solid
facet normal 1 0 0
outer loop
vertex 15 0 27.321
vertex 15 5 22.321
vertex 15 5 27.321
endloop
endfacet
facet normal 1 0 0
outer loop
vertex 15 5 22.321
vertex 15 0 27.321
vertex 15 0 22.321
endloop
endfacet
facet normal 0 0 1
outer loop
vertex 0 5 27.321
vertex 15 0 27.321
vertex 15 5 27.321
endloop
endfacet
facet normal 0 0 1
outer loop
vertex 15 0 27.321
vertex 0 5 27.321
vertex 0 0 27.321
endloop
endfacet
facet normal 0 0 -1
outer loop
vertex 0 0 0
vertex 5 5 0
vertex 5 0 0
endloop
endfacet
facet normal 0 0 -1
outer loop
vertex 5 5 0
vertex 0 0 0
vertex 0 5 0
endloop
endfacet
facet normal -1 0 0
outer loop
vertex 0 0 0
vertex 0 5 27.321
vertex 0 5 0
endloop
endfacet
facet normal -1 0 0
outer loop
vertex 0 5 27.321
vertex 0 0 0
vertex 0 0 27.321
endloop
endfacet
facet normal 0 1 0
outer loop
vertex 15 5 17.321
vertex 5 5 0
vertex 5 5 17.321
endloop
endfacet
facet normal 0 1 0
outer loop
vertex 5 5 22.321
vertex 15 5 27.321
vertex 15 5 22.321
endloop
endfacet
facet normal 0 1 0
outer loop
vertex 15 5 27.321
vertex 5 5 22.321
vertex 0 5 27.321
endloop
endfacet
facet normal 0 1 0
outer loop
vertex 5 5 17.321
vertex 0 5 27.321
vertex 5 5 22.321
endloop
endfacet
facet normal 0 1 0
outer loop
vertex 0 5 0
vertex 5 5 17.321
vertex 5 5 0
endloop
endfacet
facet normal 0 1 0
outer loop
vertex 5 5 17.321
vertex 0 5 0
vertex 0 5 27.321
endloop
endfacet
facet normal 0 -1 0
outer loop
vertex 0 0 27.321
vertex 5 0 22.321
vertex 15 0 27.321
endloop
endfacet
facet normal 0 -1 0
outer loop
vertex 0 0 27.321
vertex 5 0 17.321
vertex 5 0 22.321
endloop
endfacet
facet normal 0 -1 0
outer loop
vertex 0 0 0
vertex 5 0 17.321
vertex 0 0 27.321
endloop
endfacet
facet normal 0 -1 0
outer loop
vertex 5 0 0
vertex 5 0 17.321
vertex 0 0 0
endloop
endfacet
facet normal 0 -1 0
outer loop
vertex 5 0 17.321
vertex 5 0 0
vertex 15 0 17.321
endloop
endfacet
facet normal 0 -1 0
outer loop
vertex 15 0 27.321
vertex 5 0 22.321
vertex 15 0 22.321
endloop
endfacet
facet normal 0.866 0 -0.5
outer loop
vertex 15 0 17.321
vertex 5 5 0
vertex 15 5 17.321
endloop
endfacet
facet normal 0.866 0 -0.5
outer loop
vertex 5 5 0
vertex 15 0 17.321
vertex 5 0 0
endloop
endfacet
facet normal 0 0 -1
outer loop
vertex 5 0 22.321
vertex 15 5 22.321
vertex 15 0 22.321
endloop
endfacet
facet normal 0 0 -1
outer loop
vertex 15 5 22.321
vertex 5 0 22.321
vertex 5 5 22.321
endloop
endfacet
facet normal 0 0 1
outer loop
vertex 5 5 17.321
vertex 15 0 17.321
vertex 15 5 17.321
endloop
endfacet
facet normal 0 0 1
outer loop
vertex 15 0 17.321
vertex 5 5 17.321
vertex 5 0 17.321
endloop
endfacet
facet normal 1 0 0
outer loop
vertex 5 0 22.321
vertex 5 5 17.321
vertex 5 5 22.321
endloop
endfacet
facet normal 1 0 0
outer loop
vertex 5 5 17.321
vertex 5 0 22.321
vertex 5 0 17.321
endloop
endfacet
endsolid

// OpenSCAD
bottom_slope = 30; //Should be less than the overhang angle.

slope_width = sin(bottom_slope) * 20;
slope_height = cos(bottom_slope) * 20;

difference() {
	cube([5 + slope_width, 5, slope_height + 5 + 5]);
	translate([5, 0, 0]) {
		rotate([0, bottom_slope, 0]) {
			cube([slope_width, 5, 20]);
		}
	}
	translate([5, 0, slope_height]) {
		cube([slope_width, 5, 5]);
	}
}
